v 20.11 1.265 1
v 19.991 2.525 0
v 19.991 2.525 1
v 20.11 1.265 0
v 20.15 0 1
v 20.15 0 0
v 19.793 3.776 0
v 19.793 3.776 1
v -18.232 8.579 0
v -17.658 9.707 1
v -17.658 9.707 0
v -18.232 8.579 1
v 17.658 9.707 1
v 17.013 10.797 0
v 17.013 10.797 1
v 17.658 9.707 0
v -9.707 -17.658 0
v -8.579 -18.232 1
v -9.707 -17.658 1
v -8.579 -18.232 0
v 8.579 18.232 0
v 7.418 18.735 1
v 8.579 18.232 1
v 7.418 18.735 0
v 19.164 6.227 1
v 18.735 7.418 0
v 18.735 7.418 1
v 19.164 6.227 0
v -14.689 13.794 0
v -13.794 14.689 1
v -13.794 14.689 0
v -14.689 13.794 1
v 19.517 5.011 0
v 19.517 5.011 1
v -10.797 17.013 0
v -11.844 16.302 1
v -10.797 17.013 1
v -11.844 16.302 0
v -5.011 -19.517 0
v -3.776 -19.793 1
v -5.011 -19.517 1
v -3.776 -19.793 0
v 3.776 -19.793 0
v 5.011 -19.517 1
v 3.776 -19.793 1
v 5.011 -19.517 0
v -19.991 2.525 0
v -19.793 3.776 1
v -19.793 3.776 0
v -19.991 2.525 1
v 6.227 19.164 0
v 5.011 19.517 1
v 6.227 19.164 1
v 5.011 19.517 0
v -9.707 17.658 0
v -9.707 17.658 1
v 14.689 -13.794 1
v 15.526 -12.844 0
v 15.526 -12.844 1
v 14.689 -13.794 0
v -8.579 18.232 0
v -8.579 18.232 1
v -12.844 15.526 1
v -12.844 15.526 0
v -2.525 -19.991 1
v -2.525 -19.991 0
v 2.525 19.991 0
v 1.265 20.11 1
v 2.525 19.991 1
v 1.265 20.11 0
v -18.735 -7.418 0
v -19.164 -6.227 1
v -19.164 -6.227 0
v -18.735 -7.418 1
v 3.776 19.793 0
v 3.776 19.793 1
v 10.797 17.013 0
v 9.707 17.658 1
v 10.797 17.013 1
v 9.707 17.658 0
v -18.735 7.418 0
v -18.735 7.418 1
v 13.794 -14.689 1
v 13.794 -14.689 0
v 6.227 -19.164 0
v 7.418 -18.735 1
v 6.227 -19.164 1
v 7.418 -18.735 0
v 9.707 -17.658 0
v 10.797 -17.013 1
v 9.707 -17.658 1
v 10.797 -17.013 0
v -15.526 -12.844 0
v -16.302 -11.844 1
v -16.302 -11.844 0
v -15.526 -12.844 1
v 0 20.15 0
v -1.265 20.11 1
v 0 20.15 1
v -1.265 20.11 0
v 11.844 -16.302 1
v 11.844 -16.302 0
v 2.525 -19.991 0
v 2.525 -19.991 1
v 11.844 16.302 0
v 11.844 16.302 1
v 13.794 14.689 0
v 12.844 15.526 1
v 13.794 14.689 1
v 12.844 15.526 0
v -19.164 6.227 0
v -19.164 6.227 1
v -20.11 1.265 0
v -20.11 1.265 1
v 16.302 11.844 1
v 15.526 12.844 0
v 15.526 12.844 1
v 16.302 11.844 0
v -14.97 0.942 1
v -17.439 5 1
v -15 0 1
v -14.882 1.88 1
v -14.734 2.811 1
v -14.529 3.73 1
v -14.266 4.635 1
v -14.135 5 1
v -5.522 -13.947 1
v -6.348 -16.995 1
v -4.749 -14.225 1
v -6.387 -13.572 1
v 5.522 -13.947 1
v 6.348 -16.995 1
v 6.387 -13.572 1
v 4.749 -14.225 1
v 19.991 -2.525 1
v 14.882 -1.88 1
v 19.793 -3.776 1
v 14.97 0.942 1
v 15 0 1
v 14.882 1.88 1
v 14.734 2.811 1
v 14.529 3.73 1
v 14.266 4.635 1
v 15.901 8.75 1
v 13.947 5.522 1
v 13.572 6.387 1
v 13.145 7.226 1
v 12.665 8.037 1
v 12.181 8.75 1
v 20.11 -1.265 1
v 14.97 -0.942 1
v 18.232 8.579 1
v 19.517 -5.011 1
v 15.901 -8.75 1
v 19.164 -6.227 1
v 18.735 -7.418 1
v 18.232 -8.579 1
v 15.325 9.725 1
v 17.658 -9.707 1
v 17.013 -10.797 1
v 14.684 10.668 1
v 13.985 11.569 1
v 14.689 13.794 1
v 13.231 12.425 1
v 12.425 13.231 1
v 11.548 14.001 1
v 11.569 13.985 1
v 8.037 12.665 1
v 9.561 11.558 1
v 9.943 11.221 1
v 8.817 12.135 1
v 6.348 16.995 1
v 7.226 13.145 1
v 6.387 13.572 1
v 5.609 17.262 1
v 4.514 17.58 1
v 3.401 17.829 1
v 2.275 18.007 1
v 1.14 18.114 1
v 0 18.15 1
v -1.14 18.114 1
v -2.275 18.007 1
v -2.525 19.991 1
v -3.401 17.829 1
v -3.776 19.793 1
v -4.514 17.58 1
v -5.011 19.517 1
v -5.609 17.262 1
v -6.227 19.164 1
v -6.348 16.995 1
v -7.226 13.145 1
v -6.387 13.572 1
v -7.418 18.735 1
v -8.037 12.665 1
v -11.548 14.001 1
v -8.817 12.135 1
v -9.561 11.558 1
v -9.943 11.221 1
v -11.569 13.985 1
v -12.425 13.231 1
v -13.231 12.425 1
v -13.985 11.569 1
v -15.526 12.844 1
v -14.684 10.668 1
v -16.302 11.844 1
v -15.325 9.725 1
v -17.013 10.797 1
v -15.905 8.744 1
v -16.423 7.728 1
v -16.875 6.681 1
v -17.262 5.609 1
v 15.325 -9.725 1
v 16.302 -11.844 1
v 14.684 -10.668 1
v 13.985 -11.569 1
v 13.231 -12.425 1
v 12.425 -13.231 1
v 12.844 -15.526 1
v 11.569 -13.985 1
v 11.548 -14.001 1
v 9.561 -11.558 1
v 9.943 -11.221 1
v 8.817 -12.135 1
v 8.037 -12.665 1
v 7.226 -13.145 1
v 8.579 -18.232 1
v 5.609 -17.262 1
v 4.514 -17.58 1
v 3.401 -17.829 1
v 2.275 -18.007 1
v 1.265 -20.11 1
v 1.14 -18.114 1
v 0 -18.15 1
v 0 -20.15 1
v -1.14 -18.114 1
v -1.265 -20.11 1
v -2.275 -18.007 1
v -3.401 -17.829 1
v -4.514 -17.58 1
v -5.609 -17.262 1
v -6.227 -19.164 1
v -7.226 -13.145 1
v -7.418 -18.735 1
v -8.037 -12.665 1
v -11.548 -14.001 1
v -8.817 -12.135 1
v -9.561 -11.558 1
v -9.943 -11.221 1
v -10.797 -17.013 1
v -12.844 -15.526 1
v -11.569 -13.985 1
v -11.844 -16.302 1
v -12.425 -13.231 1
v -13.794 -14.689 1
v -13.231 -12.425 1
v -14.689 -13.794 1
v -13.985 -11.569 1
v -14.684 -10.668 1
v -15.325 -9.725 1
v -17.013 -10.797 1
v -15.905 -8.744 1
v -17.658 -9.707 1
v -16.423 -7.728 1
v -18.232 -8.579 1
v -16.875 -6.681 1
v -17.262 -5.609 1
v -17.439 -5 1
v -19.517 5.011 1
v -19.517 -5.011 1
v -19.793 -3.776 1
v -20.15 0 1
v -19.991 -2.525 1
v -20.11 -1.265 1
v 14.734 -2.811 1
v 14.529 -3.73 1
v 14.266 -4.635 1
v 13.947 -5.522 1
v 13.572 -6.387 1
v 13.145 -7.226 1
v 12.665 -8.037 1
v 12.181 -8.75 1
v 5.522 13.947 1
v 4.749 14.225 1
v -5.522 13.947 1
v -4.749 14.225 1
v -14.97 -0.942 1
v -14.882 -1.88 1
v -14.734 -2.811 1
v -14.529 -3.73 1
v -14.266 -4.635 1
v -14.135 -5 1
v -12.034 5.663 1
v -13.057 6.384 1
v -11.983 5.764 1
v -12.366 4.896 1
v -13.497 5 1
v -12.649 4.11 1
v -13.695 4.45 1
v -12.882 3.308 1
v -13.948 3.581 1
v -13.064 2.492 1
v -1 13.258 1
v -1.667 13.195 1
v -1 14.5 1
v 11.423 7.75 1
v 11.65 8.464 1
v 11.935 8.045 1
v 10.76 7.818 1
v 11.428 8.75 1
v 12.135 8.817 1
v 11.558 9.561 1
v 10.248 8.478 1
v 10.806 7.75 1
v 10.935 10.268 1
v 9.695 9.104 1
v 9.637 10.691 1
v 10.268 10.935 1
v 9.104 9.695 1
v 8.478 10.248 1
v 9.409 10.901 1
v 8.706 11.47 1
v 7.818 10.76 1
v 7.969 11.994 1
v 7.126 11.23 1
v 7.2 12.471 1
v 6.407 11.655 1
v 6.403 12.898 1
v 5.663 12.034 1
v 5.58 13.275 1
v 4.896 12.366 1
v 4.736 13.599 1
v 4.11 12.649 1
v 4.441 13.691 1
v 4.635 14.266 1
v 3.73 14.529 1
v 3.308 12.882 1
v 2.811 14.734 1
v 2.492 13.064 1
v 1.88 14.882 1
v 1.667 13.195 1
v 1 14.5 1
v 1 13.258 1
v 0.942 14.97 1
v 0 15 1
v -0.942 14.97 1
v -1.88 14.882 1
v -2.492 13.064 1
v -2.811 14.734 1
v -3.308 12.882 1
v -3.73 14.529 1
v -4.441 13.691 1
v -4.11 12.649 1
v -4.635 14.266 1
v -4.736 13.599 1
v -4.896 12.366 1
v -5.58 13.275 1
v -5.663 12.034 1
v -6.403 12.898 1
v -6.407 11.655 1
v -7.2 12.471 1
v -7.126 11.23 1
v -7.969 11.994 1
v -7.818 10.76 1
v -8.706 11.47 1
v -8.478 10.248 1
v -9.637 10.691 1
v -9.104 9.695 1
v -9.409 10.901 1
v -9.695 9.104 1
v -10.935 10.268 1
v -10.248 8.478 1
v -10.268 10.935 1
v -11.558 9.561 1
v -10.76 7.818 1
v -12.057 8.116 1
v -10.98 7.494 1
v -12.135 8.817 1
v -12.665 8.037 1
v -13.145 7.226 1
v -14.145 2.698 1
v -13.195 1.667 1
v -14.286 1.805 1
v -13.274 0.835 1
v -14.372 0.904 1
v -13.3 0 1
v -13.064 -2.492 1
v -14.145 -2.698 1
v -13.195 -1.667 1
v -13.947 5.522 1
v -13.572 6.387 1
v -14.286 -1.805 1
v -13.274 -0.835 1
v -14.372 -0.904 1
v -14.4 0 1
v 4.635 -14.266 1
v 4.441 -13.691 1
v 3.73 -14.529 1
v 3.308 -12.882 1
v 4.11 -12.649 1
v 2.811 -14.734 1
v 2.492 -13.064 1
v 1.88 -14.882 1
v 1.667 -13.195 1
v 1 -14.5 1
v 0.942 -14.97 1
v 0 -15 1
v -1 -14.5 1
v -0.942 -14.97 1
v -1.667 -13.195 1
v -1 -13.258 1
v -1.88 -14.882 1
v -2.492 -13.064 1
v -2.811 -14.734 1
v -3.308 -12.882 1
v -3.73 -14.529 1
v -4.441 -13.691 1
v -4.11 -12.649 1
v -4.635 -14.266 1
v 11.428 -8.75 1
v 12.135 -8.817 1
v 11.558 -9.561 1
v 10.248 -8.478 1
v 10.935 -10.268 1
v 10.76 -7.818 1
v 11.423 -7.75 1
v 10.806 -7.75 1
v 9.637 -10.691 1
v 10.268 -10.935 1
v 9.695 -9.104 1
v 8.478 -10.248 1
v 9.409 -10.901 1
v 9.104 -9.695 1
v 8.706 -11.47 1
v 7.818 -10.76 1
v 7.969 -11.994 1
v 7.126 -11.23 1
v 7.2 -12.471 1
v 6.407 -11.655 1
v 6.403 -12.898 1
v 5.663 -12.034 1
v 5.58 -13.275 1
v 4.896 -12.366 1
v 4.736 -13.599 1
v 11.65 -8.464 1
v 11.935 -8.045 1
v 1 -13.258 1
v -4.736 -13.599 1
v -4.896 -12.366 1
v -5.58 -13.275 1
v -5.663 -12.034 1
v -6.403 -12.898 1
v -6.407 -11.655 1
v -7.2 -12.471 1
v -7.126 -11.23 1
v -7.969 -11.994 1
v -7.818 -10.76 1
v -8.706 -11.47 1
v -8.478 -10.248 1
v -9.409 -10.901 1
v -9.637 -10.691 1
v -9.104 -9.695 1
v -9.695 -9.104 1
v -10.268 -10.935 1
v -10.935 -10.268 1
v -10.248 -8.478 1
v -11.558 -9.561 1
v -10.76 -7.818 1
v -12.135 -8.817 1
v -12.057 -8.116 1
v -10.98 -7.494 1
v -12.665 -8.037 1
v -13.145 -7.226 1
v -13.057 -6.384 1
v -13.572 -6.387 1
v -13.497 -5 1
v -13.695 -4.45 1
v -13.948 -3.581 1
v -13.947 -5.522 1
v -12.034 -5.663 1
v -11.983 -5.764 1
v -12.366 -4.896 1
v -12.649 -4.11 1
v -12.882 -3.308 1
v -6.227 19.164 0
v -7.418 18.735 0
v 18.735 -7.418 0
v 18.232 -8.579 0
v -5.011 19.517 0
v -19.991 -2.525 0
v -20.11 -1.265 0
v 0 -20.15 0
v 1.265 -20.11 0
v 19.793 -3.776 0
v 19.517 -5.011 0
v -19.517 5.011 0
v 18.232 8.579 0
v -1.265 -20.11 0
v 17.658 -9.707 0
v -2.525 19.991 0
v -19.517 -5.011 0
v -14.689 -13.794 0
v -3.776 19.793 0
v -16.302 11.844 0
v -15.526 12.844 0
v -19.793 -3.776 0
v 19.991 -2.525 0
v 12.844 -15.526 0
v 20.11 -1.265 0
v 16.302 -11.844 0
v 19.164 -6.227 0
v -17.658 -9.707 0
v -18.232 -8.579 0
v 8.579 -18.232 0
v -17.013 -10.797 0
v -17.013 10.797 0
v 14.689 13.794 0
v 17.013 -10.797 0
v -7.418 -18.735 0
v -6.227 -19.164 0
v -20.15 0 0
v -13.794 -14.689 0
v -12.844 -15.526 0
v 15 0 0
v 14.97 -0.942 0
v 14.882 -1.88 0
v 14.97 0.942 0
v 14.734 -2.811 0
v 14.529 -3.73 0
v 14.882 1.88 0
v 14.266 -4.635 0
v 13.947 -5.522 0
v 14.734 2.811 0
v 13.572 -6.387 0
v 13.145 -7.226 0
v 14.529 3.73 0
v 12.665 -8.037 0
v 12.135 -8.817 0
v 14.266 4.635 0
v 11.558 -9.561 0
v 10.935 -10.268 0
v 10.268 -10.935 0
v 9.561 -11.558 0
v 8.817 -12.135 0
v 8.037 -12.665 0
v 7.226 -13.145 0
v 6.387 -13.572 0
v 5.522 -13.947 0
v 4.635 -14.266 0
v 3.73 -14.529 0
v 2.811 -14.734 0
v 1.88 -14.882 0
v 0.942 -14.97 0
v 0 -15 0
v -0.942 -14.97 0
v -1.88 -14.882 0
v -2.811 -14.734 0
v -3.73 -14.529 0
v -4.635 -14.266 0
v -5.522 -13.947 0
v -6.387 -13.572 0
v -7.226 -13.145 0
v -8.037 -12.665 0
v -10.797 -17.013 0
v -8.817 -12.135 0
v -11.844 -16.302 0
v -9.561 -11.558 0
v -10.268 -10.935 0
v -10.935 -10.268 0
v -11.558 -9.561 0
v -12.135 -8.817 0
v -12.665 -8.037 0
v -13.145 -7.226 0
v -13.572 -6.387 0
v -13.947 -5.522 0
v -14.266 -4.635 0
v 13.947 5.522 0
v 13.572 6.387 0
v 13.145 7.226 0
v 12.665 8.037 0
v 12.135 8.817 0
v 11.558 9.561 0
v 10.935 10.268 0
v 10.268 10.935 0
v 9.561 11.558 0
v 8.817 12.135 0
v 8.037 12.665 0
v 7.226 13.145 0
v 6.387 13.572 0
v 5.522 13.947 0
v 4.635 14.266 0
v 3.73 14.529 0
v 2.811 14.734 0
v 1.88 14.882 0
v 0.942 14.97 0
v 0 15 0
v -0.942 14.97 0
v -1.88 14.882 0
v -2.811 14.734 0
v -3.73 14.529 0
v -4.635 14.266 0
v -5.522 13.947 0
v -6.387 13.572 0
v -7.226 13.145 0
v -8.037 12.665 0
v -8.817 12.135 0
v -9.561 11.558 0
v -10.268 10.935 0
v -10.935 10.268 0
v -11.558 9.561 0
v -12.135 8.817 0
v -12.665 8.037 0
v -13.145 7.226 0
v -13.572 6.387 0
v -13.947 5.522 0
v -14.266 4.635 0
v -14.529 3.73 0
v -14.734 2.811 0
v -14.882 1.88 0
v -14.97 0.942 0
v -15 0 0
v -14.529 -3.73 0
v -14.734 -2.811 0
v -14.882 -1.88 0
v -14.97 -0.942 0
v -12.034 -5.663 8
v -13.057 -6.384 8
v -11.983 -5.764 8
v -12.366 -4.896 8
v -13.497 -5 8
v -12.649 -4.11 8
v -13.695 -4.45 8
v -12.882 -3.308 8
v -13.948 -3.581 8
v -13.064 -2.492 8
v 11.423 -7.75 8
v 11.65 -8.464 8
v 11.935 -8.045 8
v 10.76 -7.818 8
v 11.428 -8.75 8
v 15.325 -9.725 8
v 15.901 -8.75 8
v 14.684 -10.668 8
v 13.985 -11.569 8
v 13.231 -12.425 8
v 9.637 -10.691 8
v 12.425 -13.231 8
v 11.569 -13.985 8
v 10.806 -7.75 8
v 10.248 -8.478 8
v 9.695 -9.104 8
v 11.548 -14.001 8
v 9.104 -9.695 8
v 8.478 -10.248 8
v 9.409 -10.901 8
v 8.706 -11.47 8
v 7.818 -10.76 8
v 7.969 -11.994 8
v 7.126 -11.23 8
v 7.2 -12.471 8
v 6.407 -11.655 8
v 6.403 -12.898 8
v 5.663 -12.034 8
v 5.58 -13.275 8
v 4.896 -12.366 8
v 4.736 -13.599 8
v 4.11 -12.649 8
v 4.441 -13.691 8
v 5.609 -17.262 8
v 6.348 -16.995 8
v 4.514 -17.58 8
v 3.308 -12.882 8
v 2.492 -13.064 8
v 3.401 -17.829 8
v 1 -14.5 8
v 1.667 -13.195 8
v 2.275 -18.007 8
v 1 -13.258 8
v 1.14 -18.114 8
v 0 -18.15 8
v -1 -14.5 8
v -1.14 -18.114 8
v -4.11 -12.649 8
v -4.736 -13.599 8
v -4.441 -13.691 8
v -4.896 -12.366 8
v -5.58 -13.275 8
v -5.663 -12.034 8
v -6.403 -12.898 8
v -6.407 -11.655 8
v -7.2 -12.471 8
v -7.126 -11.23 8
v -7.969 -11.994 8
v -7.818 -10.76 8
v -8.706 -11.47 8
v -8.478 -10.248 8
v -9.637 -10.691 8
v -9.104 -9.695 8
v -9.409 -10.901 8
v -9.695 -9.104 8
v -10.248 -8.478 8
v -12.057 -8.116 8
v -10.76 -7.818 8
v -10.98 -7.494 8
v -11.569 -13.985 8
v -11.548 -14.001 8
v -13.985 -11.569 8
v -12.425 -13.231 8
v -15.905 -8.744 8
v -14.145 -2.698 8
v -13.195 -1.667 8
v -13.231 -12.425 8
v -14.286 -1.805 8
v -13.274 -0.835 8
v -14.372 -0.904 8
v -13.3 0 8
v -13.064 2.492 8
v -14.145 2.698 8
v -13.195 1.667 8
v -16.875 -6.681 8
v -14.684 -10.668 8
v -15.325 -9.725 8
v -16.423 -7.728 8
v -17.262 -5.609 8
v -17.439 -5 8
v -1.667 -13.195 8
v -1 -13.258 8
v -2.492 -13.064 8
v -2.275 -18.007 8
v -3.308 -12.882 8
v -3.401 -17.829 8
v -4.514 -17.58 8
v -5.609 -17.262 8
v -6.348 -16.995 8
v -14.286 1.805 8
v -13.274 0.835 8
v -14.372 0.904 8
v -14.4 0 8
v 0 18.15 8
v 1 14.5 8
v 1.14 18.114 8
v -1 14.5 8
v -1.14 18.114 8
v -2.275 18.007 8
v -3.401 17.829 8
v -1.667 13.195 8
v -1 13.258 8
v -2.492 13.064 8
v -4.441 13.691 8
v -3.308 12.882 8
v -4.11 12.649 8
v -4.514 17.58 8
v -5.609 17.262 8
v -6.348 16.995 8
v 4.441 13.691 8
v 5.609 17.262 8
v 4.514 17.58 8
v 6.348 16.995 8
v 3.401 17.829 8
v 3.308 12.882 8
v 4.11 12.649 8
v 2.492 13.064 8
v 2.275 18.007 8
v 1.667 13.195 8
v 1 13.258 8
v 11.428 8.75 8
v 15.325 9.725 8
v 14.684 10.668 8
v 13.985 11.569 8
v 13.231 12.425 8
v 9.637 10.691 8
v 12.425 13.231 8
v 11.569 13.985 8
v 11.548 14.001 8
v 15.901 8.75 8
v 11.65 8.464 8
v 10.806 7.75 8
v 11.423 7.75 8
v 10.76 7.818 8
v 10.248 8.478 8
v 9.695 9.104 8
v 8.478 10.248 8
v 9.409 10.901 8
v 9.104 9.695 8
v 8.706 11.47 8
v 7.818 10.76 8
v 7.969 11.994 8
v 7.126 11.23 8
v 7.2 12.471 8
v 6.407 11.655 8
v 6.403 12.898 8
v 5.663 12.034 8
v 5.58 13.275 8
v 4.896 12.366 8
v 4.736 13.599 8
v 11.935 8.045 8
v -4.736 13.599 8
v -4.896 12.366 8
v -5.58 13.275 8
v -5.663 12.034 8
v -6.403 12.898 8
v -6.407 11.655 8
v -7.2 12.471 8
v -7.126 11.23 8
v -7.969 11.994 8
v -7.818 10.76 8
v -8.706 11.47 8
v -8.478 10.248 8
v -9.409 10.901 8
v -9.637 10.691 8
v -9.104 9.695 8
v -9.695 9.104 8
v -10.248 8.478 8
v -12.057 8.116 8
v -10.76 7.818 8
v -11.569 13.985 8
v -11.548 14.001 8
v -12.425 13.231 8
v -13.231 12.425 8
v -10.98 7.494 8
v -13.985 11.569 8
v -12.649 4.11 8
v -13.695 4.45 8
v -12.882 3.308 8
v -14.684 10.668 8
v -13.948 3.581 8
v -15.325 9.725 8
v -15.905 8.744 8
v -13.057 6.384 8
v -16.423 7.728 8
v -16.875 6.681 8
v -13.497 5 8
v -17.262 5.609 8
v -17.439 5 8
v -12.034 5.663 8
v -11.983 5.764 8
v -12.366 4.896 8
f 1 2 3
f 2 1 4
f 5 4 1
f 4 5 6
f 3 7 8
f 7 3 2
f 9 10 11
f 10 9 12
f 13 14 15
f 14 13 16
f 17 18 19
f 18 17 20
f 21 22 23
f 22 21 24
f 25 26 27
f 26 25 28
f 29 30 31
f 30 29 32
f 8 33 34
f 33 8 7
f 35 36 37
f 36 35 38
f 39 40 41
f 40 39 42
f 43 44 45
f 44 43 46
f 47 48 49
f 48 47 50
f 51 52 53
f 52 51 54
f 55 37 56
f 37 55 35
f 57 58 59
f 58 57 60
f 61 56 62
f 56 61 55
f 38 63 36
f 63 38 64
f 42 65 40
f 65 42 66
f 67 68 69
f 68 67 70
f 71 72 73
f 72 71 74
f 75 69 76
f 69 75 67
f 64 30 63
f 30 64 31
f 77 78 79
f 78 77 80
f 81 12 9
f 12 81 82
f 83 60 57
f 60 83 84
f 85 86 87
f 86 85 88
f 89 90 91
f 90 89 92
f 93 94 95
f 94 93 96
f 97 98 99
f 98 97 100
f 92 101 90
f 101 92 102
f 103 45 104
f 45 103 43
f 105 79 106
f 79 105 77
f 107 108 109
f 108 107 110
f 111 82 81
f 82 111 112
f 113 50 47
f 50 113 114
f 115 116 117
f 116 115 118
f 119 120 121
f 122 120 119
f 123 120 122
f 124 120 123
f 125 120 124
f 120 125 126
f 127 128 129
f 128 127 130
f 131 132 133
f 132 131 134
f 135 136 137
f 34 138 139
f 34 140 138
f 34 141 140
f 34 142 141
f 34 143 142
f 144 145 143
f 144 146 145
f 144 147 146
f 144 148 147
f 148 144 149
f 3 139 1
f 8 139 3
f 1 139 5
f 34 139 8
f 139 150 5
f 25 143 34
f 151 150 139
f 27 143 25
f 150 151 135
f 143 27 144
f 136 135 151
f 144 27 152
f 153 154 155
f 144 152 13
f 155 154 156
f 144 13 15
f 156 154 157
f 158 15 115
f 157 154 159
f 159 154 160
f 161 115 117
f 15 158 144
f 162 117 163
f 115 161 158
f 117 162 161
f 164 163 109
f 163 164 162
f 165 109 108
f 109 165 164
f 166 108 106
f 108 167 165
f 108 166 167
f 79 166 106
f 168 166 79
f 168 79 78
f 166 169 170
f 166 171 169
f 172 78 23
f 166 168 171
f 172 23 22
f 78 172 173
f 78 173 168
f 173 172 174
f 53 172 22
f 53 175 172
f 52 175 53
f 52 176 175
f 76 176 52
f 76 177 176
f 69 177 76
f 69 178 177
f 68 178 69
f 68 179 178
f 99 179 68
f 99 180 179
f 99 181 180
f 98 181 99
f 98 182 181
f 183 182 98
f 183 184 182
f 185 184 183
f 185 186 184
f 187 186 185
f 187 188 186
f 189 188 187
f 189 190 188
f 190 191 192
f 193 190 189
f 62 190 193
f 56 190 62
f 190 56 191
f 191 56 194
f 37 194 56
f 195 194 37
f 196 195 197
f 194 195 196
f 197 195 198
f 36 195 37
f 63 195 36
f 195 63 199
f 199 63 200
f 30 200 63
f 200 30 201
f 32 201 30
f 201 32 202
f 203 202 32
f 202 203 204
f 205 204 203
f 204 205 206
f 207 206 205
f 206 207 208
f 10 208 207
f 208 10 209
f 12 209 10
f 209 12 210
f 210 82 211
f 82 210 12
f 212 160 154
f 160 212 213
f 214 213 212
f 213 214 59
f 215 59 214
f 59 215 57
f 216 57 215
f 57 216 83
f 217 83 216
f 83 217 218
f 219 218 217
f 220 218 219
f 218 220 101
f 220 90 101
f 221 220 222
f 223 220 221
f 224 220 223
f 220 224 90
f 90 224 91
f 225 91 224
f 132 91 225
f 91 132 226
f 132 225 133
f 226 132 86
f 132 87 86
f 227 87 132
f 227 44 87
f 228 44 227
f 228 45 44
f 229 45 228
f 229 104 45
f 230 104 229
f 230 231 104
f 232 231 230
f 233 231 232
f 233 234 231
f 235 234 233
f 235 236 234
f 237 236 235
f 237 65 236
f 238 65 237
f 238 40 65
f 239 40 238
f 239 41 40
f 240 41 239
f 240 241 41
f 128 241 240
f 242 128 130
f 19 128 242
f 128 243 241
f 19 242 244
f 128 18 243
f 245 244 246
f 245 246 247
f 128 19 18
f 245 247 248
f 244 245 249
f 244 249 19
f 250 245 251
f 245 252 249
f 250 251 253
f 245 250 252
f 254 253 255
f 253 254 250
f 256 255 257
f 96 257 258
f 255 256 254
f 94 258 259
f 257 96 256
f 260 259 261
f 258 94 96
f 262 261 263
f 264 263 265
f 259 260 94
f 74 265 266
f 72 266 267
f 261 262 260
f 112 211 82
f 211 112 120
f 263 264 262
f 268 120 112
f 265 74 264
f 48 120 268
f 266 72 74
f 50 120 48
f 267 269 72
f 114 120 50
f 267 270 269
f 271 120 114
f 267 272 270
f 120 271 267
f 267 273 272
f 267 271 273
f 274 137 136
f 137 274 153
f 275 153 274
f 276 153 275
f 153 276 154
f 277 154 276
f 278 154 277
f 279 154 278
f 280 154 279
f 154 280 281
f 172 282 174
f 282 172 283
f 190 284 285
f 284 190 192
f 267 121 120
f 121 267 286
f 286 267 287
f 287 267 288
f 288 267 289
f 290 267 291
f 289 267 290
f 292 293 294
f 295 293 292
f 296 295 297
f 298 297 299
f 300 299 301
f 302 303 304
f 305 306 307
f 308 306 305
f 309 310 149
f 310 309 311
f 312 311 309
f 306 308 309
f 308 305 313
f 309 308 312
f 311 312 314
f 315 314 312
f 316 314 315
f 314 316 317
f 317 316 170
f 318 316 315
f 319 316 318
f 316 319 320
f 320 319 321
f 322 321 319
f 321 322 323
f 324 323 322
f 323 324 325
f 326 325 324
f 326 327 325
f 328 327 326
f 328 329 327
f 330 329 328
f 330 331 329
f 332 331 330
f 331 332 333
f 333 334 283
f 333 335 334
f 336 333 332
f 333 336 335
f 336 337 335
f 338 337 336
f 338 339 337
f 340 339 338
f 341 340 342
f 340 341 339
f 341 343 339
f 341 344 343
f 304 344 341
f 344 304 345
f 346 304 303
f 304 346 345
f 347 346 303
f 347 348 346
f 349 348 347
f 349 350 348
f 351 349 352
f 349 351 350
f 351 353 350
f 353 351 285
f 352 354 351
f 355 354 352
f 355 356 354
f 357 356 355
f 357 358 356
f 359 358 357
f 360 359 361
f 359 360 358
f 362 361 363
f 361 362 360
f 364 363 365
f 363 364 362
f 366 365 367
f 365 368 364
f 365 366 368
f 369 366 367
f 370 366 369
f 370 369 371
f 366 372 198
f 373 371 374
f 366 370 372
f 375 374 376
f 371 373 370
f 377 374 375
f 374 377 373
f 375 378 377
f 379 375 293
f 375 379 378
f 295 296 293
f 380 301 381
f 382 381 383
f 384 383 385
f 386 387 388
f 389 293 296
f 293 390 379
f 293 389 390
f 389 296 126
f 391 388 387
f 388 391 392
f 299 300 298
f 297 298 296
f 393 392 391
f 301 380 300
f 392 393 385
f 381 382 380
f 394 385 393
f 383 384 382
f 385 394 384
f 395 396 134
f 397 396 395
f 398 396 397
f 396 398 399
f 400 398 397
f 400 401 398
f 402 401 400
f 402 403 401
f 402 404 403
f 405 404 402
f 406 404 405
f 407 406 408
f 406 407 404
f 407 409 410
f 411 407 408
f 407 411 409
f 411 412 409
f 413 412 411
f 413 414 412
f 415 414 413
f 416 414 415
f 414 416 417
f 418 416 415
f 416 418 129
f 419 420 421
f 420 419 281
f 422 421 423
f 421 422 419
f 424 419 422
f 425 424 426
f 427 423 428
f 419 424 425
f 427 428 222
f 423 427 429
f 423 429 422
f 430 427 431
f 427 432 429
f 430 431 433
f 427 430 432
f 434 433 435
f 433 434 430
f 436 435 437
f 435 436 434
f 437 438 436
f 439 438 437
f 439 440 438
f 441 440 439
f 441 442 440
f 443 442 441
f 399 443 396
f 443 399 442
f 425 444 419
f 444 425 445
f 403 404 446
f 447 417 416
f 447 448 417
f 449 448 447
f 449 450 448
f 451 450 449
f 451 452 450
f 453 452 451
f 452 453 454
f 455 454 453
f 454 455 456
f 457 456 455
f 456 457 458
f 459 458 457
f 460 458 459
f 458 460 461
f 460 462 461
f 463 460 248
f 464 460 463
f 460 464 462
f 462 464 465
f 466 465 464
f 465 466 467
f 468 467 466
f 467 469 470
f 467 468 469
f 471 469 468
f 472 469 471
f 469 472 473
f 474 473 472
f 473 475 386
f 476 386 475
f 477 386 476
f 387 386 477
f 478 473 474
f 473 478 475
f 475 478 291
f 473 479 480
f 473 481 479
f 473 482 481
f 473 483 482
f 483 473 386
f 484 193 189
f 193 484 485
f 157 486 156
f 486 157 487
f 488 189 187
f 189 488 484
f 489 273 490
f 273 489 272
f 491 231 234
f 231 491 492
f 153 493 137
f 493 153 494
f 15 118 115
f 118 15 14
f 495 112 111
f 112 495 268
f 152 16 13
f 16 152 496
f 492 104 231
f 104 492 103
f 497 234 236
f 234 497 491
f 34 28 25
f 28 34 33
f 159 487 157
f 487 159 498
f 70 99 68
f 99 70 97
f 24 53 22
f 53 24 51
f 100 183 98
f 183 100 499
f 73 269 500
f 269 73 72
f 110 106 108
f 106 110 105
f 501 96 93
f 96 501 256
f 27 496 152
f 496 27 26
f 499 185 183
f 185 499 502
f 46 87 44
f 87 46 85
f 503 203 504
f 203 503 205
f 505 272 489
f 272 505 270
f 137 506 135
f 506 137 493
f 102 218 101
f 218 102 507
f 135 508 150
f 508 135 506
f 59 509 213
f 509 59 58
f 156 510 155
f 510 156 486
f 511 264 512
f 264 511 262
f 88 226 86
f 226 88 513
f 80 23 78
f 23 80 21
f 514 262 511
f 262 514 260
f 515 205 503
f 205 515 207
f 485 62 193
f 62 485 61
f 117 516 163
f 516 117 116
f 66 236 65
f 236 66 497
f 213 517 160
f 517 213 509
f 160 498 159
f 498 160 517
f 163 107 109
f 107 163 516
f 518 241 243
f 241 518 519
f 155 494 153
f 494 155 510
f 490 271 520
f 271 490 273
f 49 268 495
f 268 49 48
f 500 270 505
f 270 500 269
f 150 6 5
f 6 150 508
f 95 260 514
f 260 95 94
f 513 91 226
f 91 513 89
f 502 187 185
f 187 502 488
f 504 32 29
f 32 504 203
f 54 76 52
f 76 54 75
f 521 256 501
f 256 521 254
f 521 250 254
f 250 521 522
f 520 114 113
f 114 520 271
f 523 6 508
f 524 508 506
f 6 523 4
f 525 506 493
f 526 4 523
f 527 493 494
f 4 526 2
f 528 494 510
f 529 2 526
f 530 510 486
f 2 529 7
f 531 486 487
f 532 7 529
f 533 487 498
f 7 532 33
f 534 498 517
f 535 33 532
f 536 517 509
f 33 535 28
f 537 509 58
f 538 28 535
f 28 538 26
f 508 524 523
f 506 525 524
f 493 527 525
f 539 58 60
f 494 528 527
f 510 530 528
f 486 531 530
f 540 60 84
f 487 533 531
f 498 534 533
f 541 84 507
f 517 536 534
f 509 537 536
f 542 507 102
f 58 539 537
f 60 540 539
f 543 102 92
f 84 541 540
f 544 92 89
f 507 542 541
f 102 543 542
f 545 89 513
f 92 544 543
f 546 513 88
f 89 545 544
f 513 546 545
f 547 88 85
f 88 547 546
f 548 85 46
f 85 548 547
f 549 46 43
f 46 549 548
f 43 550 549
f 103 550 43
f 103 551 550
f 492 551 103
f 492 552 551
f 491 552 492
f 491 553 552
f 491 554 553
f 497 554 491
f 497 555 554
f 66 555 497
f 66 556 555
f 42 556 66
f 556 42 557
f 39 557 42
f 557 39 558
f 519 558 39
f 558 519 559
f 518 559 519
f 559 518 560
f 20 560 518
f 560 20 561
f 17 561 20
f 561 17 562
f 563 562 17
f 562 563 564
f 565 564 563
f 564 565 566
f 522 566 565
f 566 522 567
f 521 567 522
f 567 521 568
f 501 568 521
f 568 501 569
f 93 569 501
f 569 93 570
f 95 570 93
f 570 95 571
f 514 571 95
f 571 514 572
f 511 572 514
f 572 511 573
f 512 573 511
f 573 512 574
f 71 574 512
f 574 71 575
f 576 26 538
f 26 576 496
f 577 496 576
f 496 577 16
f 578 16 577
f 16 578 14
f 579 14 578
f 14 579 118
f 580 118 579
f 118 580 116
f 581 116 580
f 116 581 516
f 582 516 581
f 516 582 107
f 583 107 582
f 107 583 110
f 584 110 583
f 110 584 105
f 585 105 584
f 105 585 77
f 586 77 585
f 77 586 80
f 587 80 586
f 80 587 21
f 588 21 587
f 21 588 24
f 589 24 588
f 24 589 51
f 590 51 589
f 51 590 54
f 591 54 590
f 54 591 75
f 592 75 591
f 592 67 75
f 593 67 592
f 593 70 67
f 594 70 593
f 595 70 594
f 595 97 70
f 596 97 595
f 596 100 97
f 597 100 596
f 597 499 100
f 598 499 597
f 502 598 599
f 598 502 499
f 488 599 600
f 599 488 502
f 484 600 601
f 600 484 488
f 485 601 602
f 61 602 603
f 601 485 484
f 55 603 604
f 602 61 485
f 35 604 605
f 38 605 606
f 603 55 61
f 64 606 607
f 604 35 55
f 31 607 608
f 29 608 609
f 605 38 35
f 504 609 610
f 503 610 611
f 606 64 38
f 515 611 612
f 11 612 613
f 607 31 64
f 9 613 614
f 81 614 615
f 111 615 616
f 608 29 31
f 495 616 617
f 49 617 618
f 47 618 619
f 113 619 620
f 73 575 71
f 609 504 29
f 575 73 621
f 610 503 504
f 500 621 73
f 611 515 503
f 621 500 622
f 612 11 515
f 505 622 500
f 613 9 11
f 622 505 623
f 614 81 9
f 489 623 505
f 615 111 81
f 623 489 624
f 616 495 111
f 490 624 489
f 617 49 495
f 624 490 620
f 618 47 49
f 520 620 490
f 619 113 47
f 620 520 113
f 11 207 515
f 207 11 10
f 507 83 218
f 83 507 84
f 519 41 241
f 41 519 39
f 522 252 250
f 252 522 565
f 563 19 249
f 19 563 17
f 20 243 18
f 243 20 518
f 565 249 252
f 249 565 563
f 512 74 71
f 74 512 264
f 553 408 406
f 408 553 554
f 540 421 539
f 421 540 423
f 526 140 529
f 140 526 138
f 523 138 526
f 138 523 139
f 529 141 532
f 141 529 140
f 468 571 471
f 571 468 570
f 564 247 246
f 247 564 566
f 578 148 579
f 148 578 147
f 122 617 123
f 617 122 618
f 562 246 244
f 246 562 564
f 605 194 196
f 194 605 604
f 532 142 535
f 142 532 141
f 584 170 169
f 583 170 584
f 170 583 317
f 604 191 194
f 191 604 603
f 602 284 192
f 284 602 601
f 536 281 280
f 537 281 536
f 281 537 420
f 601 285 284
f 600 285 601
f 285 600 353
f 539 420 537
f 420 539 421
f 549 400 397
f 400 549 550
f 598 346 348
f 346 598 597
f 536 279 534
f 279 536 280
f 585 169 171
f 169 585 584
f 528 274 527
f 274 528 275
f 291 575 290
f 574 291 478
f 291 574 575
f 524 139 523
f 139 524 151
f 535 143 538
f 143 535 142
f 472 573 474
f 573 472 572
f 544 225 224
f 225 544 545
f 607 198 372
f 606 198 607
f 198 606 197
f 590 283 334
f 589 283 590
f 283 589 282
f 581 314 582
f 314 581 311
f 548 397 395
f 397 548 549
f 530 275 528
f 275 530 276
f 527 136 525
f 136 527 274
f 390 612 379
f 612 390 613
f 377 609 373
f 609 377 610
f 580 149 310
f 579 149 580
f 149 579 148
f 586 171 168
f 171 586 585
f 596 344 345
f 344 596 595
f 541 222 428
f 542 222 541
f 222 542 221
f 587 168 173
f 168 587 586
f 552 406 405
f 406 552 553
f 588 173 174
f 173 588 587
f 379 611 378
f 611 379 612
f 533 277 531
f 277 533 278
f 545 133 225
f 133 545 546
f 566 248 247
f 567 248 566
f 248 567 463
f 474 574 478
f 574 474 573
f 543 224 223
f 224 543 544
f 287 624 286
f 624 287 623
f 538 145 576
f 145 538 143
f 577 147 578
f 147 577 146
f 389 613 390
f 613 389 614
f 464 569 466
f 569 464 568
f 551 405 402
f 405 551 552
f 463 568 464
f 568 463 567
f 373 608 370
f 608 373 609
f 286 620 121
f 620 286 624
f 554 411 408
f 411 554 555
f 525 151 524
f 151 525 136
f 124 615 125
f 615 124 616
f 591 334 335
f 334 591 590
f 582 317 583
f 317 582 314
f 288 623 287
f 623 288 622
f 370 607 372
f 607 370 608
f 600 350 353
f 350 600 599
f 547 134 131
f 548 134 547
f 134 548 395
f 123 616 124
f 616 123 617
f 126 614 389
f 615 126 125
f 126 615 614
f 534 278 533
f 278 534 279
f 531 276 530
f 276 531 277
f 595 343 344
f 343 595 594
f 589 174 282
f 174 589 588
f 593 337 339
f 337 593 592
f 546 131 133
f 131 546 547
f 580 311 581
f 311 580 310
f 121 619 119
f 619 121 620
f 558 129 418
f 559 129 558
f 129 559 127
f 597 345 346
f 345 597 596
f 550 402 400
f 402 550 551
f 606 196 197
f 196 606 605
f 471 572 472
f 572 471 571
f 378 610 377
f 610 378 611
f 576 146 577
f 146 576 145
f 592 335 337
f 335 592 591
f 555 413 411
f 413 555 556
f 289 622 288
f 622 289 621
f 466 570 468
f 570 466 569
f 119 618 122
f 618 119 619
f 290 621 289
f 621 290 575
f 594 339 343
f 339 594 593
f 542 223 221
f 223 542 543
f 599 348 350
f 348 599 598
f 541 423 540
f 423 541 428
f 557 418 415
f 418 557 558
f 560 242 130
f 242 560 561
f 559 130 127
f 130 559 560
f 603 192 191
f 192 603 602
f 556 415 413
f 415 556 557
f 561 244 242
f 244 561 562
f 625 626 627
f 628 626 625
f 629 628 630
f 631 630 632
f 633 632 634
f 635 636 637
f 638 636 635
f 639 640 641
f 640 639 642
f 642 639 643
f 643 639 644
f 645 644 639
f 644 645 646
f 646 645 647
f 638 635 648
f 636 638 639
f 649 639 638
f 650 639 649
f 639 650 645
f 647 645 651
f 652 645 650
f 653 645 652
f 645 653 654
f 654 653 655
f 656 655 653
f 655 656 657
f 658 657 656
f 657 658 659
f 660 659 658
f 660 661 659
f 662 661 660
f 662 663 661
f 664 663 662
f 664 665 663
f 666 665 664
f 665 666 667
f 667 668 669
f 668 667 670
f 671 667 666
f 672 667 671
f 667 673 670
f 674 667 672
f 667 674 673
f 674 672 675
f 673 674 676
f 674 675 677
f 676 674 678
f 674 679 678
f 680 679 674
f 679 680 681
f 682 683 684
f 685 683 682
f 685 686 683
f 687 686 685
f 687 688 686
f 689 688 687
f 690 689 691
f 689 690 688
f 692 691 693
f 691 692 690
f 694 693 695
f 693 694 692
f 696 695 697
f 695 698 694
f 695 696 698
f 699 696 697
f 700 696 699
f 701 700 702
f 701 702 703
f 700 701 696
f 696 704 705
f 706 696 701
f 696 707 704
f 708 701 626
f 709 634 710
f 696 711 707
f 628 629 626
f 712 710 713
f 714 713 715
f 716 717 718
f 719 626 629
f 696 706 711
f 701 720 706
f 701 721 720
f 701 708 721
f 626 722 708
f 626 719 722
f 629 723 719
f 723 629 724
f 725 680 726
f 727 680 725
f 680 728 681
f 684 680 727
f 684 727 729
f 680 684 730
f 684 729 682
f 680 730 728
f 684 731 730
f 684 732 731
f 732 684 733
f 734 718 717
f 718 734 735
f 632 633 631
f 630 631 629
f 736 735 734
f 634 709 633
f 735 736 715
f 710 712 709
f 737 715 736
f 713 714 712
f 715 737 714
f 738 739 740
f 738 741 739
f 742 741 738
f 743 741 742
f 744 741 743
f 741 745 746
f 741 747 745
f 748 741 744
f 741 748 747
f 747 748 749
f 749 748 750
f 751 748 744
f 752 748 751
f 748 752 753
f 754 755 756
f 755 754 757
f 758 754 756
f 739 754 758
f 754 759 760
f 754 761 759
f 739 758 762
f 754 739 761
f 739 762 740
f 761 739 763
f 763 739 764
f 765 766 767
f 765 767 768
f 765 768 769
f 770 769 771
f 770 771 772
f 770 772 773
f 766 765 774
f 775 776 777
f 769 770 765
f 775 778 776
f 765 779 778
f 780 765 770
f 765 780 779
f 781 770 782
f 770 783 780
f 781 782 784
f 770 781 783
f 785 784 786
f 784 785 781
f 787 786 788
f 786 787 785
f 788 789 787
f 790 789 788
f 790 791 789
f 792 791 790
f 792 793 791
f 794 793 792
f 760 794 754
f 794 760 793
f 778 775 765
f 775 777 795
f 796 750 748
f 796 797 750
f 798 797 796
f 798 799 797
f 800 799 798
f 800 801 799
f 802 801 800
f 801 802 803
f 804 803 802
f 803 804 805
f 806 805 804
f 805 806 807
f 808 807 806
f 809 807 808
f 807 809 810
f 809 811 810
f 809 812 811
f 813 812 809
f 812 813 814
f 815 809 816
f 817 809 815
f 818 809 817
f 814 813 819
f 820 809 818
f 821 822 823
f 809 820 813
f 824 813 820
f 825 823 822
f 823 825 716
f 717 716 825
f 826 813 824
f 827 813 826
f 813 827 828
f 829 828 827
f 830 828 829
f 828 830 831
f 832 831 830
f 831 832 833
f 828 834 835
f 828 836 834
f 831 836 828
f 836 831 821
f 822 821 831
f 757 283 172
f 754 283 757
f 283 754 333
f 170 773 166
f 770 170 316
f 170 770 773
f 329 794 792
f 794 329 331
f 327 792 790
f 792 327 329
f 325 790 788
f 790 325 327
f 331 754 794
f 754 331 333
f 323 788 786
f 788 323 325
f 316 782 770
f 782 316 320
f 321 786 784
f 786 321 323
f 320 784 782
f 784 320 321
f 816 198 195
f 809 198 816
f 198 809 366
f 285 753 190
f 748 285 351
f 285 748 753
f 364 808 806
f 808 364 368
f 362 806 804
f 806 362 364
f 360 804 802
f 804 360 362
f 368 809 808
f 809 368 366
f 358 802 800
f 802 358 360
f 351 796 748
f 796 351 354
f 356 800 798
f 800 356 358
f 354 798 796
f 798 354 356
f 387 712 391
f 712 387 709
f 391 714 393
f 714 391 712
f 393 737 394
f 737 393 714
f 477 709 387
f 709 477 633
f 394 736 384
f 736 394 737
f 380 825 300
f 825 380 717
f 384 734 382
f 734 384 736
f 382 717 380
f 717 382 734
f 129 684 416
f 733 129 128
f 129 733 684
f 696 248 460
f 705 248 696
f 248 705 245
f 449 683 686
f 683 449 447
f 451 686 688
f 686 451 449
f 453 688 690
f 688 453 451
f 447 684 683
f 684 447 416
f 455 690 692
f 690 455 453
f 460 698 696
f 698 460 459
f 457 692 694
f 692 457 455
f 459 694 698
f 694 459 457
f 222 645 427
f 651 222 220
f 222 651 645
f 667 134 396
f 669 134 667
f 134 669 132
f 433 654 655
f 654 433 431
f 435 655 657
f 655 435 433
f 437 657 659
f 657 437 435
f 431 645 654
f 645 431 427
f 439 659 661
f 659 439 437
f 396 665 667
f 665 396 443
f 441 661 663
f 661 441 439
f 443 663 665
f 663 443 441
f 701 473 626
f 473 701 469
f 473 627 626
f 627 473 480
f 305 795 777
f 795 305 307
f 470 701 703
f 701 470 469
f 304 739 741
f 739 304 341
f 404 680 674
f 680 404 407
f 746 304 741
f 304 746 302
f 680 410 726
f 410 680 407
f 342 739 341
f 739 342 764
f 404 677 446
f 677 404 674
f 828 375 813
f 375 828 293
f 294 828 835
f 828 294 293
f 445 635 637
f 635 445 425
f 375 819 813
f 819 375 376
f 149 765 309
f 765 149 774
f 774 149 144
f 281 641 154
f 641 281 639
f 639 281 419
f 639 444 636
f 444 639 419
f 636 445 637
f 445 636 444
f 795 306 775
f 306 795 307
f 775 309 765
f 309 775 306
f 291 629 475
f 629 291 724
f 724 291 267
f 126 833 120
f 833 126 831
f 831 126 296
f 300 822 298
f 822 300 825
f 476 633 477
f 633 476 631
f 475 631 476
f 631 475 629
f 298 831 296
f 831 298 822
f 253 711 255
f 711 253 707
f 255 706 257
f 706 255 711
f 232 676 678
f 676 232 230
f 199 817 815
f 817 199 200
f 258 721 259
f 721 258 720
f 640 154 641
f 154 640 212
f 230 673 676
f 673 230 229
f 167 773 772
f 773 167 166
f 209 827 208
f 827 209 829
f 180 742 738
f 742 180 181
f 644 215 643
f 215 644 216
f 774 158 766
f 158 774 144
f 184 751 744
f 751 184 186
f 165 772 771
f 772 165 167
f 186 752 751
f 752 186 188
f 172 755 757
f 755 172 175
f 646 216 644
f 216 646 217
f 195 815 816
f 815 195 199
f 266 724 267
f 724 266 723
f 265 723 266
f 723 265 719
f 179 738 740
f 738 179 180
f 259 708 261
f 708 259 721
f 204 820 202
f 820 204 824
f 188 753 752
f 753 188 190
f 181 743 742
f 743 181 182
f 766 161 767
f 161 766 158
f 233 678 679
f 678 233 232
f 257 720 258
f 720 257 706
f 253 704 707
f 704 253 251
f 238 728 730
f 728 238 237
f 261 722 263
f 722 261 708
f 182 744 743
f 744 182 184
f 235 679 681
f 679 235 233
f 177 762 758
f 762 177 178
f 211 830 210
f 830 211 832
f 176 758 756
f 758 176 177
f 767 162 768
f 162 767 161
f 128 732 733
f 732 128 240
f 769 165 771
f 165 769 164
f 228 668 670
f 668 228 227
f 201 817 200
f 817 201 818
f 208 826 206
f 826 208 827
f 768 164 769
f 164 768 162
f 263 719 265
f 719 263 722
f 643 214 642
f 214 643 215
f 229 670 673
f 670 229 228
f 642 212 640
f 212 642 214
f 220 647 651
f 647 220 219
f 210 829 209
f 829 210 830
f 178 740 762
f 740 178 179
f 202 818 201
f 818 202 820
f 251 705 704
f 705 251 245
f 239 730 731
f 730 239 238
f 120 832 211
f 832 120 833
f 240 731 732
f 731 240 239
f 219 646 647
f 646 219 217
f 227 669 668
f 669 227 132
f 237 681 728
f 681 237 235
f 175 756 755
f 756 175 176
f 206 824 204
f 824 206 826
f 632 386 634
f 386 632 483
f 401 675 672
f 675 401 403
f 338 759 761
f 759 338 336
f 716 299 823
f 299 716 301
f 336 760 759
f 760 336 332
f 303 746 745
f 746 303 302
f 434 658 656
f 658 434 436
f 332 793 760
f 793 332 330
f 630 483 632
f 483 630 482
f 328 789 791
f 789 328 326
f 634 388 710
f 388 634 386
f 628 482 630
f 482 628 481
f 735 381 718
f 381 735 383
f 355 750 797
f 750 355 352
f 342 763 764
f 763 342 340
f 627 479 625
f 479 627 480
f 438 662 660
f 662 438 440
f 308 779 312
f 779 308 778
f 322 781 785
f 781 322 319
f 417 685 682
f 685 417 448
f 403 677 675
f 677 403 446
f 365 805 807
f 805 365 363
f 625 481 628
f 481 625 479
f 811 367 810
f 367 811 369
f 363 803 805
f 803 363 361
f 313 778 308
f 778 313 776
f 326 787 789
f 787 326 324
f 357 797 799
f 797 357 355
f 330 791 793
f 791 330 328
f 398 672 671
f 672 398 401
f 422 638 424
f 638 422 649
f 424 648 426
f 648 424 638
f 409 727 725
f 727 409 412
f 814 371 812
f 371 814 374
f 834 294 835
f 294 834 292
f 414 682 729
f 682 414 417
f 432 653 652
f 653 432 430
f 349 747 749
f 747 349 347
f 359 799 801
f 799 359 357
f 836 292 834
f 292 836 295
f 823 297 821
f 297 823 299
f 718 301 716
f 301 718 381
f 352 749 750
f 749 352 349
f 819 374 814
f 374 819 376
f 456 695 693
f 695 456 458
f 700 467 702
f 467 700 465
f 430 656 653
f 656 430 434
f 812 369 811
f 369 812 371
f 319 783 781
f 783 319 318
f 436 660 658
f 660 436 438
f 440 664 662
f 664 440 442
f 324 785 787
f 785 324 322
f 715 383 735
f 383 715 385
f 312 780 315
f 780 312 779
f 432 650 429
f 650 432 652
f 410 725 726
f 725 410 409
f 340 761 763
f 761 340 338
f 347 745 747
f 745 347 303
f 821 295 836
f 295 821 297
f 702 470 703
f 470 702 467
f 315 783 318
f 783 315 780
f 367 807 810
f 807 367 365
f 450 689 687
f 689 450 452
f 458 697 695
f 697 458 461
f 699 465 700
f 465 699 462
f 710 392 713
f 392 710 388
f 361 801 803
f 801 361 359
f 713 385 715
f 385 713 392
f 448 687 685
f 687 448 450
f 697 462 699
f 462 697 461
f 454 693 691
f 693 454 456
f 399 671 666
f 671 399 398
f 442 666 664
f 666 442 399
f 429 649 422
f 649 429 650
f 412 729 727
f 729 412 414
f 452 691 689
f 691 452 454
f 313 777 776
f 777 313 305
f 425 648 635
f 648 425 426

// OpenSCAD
// Comment out follwing line for main bit (inner)
END_BIT = true;

inner_dia = 26.6;
inner_fin_dia = 29;

flange_dia = 30;
flange_height = 1;
flange_extra = 2;

fin_width = 2;
fin_count = 6;
blind_fin_dia = 28.8;
// blind_fin_width = 2.5;
blind_fin_width = 6;
// blind_big_fin_width = 9;
blind_big_fin_width1 = 17.5;
blind_big_fin_width2 = 10;
outer_dia = 36.3;

notch_depth = .2;
notch_width = 1;
notch_height = 16;

$fn=100;

if (END_BIT == undef){
    mainbit(25);
    // notch to hold in place
    color("Blue"){
        rotate(220) {translate([(inner_dia / 2)-notch_depth, 0, notch_height]) {
            cube([notch_depth, notch_width, notch_depth], center=true);
    }
}}
}

if (END_BIT == true) {
    height=7;
    // Flange
    difference () {
        cylinder (h = flange_height, d=outer_dia + flange_extra * 2, center = false);
        translate([0,0,-.1]) cylinder (h = height, d=flange_dia, center = false);
    }
    translate([0,0,flange_height]) mainbit(height);
}

module mainbit(height){
difference () {
    cylinder (h = height, d=outer_dia, center = false);
    // Remove the main inner cylinder
    cylinder (h = height*3, d=inner_dia, center = true);
    // Remove the blind fins
    for (a = [0: 360 / fin_count : 360-1]) {
        rotate (a) {
            difference() {
                translate([0, -blind_fin_width/ 2, -.1]) {
                    cube ([outer_dia, blind_fin_width, height+.2]);
                }
                cylinder (h = height, d=blind_fin_dia, center = false);
            }
        }
    }

    // Remove the motor inner fins
    difference() {
        union() {
            for (a = [360 / fin_count/2: 360 / fin_count : 179]) {
                rotate (a) {
                    translate([-inner_fin_dia / 2, -fin_width / 2, -.1]) {
                        cube ([inner_fin_dia, fin_width, height+.2]);
                    }
                }
            }
        }
        // Put in an end stop to prevent motor pushing past insert
        translate([0, 0, notch_height]) cylinder(d=inner_fin_dia, h=1); 
        // And the big bit from the stop
    }

    // Remove the blind big fins
    bigfin(0, blind_big_fin_width1, height, blind_fin_dia);
    bigfin(180, blind_big_fin_width2, height, blind_fin_dia);

    // Remove the "leftover" bit on the big side
    cutout = 15.5;
    translate([0, -cutout/2, -.1]) cube([outer_dia, cutout, height+.2]);
}
}

module bigfin(angle, width, height, innerd) {
    rotate (angle) {
        difference() {
            translate([0, -width/ 2, -.1]) {
                cube ([outer_dia, width, height+.2]);
            }
            cylinder (h = height, d=innerd, center = false);
        }
    }
}
